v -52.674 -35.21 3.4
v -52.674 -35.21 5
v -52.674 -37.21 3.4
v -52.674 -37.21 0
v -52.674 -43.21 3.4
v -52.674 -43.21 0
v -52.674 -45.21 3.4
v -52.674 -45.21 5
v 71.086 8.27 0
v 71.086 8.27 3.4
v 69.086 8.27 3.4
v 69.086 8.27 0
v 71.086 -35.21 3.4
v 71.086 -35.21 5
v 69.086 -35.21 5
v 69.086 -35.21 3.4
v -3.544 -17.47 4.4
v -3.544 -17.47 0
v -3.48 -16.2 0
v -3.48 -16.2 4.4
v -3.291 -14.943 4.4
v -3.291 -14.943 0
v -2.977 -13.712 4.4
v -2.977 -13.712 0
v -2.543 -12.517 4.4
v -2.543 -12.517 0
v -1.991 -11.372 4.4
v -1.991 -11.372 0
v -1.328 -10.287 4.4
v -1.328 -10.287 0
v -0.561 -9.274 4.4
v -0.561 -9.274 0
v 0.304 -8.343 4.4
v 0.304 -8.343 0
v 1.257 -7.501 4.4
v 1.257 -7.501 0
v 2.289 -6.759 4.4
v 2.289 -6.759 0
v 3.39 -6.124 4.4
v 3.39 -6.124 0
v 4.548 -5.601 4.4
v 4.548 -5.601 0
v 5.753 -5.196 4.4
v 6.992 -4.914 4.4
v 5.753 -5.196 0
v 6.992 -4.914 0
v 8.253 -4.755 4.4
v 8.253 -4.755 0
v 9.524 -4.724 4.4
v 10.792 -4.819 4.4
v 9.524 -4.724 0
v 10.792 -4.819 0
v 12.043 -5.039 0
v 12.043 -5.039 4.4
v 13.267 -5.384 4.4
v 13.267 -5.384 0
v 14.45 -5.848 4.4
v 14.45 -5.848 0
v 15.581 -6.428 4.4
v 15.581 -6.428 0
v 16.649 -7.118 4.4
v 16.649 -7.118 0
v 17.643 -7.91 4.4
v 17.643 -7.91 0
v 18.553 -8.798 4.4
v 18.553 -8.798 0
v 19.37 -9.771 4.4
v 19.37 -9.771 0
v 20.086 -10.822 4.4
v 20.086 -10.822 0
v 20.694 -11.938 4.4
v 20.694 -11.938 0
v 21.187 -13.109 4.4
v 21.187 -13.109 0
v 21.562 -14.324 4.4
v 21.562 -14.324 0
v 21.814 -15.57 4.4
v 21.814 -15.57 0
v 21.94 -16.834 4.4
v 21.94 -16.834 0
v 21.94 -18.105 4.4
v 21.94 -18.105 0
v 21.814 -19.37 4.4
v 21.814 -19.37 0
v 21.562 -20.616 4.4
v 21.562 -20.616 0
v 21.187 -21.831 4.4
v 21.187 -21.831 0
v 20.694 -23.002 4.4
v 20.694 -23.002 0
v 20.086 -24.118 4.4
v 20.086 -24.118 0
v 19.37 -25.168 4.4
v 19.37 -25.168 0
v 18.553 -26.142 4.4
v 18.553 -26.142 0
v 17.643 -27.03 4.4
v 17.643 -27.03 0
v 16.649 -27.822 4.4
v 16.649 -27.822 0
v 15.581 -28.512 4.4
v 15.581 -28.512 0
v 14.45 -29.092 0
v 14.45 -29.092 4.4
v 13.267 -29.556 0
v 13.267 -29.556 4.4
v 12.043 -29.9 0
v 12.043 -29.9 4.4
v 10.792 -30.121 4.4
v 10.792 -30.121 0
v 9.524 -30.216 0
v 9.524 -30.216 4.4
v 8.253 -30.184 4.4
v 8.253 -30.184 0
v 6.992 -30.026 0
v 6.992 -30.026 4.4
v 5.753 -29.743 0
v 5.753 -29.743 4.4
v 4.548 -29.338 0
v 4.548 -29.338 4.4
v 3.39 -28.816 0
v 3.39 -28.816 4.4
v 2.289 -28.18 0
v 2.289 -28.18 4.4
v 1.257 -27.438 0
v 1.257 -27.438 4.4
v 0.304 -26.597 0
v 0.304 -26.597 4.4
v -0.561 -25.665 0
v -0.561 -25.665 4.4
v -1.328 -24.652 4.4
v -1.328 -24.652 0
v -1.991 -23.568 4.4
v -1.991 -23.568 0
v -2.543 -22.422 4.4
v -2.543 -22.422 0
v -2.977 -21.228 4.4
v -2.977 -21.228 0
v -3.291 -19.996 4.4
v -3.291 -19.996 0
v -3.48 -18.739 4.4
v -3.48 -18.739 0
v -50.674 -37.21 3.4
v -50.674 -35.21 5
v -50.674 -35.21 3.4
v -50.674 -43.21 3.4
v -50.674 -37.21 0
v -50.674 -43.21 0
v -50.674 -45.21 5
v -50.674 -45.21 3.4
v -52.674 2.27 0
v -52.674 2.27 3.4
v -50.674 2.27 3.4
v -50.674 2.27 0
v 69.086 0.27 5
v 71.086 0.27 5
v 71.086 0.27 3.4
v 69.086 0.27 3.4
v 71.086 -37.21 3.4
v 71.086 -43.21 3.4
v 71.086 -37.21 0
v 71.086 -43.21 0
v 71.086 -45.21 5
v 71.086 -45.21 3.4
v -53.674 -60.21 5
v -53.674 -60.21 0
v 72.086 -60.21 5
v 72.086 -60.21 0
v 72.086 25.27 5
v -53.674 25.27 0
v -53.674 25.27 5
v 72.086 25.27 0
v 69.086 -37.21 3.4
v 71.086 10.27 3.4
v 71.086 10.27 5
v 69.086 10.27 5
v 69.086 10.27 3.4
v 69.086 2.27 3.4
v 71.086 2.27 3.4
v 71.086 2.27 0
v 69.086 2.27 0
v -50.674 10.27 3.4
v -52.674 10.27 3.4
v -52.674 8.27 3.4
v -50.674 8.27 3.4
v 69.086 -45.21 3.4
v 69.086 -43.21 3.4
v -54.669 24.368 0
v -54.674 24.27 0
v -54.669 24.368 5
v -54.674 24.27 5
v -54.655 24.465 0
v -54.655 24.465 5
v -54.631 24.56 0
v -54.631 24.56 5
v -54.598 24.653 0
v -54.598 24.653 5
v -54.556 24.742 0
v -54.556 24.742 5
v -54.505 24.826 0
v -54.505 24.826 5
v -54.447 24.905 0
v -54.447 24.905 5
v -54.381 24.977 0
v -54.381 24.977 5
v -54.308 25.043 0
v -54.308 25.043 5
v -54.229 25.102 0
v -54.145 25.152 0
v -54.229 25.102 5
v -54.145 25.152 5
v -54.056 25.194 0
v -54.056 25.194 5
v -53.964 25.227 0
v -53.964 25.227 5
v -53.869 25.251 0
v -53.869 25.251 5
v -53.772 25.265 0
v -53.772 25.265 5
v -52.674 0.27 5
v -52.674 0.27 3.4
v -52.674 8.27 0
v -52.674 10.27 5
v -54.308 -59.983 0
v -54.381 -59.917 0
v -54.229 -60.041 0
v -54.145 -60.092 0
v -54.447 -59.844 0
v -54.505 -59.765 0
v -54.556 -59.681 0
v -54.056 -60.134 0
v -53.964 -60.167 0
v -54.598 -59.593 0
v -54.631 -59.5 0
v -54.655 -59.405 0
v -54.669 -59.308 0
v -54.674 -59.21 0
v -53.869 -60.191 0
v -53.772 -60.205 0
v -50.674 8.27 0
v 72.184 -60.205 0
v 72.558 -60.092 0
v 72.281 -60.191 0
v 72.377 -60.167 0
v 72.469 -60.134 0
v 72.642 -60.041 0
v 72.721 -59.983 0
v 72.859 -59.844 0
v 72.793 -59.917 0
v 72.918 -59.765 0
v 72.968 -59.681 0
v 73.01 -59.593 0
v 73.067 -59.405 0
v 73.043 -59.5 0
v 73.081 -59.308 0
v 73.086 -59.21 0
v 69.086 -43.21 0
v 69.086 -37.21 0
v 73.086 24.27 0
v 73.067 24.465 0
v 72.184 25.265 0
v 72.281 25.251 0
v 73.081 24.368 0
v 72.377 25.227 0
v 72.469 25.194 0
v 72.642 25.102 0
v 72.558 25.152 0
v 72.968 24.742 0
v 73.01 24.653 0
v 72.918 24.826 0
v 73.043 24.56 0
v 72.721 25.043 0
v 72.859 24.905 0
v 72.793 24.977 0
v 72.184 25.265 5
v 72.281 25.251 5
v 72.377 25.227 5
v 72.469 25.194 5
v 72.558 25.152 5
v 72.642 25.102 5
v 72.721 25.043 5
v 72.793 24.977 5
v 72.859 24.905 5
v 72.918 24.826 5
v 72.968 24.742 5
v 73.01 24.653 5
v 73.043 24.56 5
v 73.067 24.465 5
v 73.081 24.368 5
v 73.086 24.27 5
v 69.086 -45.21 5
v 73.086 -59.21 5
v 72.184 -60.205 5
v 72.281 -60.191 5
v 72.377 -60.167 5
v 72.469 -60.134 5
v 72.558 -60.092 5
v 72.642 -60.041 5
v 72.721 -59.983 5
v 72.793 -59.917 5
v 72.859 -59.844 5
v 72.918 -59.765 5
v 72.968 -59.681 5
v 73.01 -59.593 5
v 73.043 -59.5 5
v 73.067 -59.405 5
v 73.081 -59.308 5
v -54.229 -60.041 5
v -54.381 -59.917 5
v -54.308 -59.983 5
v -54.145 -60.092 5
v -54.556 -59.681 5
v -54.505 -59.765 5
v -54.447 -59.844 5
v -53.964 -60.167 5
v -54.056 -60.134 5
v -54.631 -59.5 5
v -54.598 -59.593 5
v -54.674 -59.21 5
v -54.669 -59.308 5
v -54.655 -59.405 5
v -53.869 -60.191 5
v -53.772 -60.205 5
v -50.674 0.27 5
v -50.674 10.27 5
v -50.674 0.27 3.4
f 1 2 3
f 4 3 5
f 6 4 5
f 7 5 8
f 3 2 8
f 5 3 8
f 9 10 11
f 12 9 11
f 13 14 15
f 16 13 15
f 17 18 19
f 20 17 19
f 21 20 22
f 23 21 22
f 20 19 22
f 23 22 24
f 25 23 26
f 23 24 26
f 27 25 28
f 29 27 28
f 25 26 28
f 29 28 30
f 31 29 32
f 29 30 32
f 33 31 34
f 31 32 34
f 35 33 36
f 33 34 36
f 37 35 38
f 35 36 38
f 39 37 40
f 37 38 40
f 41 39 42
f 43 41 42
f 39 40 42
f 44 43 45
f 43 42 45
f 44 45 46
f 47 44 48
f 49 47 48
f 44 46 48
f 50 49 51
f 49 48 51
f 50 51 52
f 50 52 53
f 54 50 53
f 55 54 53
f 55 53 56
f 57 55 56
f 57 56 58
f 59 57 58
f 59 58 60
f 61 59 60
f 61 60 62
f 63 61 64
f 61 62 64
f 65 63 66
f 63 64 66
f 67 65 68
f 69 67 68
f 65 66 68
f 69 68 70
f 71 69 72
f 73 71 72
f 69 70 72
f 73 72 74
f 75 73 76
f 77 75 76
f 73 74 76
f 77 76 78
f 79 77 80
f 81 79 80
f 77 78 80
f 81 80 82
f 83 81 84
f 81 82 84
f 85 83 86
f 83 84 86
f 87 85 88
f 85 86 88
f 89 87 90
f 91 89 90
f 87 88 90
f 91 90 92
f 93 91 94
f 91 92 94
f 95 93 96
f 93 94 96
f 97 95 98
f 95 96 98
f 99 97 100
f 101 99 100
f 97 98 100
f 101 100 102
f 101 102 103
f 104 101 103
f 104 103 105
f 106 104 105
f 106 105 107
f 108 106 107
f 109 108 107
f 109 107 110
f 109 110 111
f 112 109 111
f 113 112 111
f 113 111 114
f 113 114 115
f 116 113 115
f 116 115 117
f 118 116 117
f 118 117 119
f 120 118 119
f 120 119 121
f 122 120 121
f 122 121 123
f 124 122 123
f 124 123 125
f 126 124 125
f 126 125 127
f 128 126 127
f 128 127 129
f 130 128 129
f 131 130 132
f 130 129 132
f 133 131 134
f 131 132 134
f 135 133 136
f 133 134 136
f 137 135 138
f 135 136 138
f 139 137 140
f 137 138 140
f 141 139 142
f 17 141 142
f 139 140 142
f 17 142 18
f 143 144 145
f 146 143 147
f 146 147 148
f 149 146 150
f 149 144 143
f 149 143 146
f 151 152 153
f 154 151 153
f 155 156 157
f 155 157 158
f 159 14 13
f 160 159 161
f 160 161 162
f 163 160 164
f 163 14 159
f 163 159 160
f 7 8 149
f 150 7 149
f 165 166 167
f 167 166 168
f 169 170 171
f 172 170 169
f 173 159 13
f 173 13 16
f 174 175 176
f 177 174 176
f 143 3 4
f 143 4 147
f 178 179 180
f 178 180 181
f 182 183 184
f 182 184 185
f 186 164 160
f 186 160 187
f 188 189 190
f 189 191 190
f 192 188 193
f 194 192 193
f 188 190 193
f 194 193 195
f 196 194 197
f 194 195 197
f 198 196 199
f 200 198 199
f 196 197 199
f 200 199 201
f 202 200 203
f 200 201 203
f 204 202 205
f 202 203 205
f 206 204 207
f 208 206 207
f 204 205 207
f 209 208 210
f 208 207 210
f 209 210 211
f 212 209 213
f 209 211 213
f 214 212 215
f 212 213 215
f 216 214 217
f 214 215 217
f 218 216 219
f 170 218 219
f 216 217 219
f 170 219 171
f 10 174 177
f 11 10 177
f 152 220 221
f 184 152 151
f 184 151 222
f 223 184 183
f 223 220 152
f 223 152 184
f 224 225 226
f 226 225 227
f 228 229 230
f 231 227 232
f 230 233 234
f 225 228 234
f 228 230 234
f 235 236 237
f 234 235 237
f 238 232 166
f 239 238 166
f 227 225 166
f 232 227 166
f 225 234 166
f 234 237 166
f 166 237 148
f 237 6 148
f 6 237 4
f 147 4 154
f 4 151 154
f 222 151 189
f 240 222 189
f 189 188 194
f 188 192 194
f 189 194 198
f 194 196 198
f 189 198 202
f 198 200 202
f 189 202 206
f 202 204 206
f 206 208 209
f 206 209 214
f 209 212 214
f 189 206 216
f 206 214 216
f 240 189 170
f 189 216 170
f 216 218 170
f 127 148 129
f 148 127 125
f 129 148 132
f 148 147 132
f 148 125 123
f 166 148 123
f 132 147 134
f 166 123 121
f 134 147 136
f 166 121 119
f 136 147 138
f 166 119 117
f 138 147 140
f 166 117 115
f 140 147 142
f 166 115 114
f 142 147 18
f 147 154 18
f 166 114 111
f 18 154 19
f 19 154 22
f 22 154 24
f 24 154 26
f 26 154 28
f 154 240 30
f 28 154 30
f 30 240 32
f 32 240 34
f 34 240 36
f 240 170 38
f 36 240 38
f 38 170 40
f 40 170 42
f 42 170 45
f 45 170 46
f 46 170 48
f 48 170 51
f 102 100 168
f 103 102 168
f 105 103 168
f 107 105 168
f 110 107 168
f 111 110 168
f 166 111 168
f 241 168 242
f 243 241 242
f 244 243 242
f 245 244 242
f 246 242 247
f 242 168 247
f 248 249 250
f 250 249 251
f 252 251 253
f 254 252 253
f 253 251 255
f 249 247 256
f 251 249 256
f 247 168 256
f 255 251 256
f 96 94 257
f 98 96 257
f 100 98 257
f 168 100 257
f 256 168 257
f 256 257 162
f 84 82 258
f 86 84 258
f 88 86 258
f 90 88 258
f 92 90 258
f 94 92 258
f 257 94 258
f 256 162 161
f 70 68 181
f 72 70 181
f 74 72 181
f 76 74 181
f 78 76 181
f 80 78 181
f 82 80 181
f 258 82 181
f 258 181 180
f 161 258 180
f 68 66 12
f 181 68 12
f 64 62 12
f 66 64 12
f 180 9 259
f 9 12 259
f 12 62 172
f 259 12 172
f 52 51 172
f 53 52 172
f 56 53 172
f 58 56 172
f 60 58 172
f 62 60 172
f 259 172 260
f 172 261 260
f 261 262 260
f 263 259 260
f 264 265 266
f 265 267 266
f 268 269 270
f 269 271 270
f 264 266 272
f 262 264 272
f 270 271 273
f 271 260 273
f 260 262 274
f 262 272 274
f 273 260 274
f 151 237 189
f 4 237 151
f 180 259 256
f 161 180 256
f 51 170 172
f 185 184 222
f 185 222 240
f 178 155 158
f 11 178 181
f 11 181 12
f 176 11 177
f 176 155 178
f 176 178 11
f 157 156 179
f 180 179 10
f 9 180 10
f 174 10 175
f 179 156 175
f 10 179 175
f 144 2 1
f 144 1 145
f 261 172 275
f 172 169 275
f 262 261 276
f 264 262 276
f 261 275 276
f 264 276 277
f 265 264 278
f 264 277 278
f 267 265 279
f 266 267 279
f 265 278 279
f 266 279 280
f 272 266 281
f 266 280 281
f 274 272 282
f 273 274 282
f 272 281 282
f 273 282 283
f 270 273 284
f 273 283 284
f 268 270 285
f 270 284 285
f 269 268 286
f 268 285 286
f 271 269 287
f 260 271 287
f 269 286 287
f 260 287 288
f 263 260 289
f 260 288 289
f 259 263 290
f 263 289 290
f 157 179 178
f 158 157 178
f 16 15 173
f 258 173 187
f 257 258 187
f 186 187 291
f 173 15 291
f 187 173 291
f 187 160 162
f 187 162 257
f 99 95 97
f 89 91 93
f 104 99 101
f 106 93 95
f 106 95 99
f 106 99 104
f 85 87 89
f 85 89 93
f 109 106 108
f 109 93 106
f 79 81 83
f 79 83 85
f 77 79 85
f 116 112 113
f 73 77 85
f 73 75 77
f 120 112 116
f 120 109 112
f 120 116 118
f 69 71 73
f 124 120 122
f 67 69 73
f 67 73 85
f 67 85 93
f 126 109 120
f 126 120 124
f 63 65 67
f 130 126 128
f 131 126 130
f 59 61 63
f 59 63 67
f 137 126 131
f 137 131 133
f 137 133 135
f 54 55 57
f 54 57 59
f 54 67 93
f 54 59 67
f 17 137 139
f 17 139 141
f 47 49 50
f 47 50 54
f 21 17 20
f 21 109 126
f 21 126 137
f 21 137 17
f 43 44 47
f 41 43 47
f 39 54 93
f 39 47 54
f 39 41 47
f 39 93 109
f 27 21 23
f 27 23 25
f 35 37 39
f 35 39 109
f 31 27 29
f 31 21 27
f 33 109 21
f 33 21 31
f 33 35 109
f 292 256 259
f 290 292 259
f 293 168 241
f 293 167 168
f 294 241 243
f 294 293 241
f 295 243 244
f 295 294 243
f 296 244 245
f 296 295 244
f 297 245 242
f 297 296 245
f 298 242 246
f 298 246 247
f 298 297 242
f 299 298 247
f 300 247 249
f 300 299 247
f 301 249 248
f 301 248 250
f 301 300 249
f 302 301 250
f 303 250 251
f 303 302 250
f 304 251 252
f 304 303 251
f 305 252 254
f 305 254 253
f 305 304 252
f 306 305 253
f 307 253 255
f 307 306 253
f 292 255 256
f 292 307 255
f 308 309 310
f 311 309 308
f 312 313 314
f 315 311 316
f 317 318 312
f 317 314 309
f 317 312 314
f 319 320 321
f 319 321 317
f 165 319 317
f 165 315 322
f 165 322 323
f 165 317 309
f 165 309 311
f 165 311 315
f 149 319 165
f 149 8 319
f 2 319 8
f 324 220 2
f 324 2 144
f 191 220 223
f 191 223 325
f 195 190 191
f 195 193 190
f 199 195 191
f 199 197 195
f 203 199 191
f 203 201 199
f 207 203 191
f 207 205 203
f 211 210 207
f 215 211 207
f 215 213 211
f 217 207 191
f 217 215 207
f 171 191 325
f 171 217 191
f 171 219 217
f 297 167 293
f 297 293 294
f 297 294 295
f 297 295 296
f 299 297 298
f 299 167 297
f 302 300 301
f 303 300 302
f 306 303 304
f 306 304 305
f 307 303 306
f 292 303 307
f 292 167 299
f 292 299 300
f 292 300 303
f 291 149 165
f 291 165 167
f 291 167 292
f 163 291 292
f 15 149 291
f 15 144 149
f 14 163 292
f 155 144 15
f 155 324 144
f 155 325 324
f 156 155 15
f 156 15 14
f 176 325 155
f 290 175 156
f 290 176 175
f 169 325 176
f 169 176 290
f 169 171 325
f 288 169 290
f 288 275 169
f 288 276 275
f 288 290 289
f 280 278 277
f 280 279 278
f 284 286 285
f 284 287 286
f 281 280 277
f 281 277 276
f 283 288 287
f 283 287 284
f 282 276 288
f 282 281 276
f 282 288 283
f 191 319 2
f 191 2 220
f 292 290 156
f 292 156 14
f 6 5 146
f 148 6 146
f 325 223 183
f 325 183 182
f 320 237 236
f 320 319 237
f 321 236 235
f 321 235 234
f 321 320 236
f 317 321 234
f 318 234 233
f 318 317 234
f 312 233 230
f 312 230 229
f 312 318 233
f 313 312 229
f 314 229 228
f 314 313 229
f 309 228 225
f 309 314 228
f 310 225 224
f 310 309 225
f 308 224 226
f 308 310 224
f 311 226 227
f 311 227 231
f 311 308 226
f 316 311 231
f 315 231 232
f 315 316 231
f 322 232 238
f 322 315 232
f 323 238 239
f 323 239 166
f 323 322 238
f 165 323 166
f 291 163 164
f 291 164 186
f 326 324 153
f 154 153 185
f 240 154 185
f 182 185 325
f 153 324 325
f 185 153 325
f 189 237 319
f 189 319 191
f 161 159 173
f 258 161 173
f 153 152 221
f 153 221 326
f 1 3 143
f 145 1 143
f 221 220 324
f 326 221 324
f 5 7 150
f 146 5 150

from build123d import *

# Parameters (mm, degrees)
SKETCH1_W               = 127.76
SKETCH1_H               = 85.48
BOSS_EXTRUDE1_DEPTH     = 5
SKETCH3_W               = 2
SKETCH3_H               = 10
CUT_EXTRUDE2_DEPTH      = 1.6
SKETCH4_W               = 2
SKETCH4_H               = 6
CUT_EXTRUDE3_DEPTH      = 95.754317257
MIRROR2_COPY_1_SKETCH_W = 2
MIRROR2_COPY_1_SKETCH_H = 10
MIRROR2_COPY_1_DEPTH    = 1.6
MIRROR2_COPY_2_SKETCH_W = 2
MIRROR2_COPY_2_SKETCH_H = 6
MIRROR2_COPY_2_DEPTH    = 95.754317257
SKETCH6_R               = 12.75
CUT_EXTRUDE4_DEPTH      = 4.4
FILLET1_R               = 1


with BuildPart() as part:
    # Sketch1 → Boss-Extrude1 (new body)
    with BuildSketch(Plane.XY):
        with Locations((9.206235294, -17.469823529)):
            Rectangle(SKETCH1_W, SKETCH1_H)
    extrude(amount=BOSS_EXTRUDE1_DEPTH)

    # Sketch3 → Cut-Extrude2 (cut)
    with BuildSketch(Plane.XY.offset(5)):
        with Locations((-51.673764706, 5.270176471)):
            Rectangle(SKETCH3_W, SKETCH3_H)
    cut_extrude2 = extrude(amount=-CUT_EXTRUDE2_DEPTH, mode=Mode.SUBTRACT)

    # Sketch4 → Cut-Extrude3 (cut, through all)
    with BuildSketch(Plane.XY.offset(3.4)):
        with Locations((-51.673764706, 5.270176471)):
            Rectangle(SKETCH4_W, SKETCH4_H)
    cut_extrude3 = extrude(amount=-CUT_EXTRUDE3_DEPTH, mode=Mode.SUBTRACT)

    # Mirror1: Cut-Extrude2, Cut-Extrude3 across plane
    add(cut_extrude2.mirror(Plane.ZY.offset(-9.206235294)), mode=Mode.SUBTRACT)
    add(cut_extrude3.mirror(Plane.ZY.offset(-9.206235294)), mode=Mode.SUBTRACT)

    # Mirror2: Cut-Extrude2, Cut-Extrude3 across plane
    add(cut_extrude2.mirror(Plane.ZX.offset(-17.469823529)), mode=Mode.SUBTRACT)
    add(cut_extrude3.mirror(Plane.ZX.offset(-17.469823529)), mode=Mode.SUBTRACT)

    # Mirror2 copy 1 sketch → Mirror2 copy 1 (cut)
    with BuildSketch(Plane(origin=(18.412470588, -34.939647059, 5), x_dir=(-1, 0, 0), z_dir=(0, 0, 1))):
        with Locations((-51.673764706, 5.270176471)):
            Rectangle(MIRROR2_COPY_1_SKETCH_W, MIRROR2_COPY_1_SKETCH_H)
    extrude(amount=-MIRROR2_COPY_1_DEPTH, mode=Mode.SUBTRACT)

    # Mirror2 copy 2 sketch → Mirror2 copy 2 (cut, through all)
    with BuildSketch(Plane(origin=(18.412470588, -34.939647059, 3.4), x_dir=(-1, 0, 0), z_dir=(0, 0, 1))):
        with Locations((-51.673764706, 5.270176471)):
            Rectangle(MIRROR2_COPY_2_SKETCH_W, MIRROR2_COPY_2_SKETCH_H)
    extrude(amount=-MIRROR2_COPY_2_DEPTH, mode=Mode.SUBTRACT)

    # Sketch6 → Cut-Extrude4 (cut)
    with BuildSketch(Plane(origin=(0, 0, 0), x_dir=(-1, 0, 0), z_dir=(0, 0, -1))):
        with Locations((-9.206235294, -17.469823529)):
            Circle(SKETCH6_R)
    extrude(amount=-CUT_EXTRUDE4_DEPTH, mode=Mode.SUBTRACT)

    # Fillet1
    fillet1_edges = [part.edges().sort_by_distance(p)[0] for p in [
        (-54.673764706, 25.270176471, 2.5),
        (73.086235294, 25.270176471, 2.5),
        (73.086235294, -60.209823529, 2.5),
        (-54.673764706, -60.209823529, 2.5),
    ]]
    fillet(fillet1_edges, radius=FILLET1_R)


solid = part.part
